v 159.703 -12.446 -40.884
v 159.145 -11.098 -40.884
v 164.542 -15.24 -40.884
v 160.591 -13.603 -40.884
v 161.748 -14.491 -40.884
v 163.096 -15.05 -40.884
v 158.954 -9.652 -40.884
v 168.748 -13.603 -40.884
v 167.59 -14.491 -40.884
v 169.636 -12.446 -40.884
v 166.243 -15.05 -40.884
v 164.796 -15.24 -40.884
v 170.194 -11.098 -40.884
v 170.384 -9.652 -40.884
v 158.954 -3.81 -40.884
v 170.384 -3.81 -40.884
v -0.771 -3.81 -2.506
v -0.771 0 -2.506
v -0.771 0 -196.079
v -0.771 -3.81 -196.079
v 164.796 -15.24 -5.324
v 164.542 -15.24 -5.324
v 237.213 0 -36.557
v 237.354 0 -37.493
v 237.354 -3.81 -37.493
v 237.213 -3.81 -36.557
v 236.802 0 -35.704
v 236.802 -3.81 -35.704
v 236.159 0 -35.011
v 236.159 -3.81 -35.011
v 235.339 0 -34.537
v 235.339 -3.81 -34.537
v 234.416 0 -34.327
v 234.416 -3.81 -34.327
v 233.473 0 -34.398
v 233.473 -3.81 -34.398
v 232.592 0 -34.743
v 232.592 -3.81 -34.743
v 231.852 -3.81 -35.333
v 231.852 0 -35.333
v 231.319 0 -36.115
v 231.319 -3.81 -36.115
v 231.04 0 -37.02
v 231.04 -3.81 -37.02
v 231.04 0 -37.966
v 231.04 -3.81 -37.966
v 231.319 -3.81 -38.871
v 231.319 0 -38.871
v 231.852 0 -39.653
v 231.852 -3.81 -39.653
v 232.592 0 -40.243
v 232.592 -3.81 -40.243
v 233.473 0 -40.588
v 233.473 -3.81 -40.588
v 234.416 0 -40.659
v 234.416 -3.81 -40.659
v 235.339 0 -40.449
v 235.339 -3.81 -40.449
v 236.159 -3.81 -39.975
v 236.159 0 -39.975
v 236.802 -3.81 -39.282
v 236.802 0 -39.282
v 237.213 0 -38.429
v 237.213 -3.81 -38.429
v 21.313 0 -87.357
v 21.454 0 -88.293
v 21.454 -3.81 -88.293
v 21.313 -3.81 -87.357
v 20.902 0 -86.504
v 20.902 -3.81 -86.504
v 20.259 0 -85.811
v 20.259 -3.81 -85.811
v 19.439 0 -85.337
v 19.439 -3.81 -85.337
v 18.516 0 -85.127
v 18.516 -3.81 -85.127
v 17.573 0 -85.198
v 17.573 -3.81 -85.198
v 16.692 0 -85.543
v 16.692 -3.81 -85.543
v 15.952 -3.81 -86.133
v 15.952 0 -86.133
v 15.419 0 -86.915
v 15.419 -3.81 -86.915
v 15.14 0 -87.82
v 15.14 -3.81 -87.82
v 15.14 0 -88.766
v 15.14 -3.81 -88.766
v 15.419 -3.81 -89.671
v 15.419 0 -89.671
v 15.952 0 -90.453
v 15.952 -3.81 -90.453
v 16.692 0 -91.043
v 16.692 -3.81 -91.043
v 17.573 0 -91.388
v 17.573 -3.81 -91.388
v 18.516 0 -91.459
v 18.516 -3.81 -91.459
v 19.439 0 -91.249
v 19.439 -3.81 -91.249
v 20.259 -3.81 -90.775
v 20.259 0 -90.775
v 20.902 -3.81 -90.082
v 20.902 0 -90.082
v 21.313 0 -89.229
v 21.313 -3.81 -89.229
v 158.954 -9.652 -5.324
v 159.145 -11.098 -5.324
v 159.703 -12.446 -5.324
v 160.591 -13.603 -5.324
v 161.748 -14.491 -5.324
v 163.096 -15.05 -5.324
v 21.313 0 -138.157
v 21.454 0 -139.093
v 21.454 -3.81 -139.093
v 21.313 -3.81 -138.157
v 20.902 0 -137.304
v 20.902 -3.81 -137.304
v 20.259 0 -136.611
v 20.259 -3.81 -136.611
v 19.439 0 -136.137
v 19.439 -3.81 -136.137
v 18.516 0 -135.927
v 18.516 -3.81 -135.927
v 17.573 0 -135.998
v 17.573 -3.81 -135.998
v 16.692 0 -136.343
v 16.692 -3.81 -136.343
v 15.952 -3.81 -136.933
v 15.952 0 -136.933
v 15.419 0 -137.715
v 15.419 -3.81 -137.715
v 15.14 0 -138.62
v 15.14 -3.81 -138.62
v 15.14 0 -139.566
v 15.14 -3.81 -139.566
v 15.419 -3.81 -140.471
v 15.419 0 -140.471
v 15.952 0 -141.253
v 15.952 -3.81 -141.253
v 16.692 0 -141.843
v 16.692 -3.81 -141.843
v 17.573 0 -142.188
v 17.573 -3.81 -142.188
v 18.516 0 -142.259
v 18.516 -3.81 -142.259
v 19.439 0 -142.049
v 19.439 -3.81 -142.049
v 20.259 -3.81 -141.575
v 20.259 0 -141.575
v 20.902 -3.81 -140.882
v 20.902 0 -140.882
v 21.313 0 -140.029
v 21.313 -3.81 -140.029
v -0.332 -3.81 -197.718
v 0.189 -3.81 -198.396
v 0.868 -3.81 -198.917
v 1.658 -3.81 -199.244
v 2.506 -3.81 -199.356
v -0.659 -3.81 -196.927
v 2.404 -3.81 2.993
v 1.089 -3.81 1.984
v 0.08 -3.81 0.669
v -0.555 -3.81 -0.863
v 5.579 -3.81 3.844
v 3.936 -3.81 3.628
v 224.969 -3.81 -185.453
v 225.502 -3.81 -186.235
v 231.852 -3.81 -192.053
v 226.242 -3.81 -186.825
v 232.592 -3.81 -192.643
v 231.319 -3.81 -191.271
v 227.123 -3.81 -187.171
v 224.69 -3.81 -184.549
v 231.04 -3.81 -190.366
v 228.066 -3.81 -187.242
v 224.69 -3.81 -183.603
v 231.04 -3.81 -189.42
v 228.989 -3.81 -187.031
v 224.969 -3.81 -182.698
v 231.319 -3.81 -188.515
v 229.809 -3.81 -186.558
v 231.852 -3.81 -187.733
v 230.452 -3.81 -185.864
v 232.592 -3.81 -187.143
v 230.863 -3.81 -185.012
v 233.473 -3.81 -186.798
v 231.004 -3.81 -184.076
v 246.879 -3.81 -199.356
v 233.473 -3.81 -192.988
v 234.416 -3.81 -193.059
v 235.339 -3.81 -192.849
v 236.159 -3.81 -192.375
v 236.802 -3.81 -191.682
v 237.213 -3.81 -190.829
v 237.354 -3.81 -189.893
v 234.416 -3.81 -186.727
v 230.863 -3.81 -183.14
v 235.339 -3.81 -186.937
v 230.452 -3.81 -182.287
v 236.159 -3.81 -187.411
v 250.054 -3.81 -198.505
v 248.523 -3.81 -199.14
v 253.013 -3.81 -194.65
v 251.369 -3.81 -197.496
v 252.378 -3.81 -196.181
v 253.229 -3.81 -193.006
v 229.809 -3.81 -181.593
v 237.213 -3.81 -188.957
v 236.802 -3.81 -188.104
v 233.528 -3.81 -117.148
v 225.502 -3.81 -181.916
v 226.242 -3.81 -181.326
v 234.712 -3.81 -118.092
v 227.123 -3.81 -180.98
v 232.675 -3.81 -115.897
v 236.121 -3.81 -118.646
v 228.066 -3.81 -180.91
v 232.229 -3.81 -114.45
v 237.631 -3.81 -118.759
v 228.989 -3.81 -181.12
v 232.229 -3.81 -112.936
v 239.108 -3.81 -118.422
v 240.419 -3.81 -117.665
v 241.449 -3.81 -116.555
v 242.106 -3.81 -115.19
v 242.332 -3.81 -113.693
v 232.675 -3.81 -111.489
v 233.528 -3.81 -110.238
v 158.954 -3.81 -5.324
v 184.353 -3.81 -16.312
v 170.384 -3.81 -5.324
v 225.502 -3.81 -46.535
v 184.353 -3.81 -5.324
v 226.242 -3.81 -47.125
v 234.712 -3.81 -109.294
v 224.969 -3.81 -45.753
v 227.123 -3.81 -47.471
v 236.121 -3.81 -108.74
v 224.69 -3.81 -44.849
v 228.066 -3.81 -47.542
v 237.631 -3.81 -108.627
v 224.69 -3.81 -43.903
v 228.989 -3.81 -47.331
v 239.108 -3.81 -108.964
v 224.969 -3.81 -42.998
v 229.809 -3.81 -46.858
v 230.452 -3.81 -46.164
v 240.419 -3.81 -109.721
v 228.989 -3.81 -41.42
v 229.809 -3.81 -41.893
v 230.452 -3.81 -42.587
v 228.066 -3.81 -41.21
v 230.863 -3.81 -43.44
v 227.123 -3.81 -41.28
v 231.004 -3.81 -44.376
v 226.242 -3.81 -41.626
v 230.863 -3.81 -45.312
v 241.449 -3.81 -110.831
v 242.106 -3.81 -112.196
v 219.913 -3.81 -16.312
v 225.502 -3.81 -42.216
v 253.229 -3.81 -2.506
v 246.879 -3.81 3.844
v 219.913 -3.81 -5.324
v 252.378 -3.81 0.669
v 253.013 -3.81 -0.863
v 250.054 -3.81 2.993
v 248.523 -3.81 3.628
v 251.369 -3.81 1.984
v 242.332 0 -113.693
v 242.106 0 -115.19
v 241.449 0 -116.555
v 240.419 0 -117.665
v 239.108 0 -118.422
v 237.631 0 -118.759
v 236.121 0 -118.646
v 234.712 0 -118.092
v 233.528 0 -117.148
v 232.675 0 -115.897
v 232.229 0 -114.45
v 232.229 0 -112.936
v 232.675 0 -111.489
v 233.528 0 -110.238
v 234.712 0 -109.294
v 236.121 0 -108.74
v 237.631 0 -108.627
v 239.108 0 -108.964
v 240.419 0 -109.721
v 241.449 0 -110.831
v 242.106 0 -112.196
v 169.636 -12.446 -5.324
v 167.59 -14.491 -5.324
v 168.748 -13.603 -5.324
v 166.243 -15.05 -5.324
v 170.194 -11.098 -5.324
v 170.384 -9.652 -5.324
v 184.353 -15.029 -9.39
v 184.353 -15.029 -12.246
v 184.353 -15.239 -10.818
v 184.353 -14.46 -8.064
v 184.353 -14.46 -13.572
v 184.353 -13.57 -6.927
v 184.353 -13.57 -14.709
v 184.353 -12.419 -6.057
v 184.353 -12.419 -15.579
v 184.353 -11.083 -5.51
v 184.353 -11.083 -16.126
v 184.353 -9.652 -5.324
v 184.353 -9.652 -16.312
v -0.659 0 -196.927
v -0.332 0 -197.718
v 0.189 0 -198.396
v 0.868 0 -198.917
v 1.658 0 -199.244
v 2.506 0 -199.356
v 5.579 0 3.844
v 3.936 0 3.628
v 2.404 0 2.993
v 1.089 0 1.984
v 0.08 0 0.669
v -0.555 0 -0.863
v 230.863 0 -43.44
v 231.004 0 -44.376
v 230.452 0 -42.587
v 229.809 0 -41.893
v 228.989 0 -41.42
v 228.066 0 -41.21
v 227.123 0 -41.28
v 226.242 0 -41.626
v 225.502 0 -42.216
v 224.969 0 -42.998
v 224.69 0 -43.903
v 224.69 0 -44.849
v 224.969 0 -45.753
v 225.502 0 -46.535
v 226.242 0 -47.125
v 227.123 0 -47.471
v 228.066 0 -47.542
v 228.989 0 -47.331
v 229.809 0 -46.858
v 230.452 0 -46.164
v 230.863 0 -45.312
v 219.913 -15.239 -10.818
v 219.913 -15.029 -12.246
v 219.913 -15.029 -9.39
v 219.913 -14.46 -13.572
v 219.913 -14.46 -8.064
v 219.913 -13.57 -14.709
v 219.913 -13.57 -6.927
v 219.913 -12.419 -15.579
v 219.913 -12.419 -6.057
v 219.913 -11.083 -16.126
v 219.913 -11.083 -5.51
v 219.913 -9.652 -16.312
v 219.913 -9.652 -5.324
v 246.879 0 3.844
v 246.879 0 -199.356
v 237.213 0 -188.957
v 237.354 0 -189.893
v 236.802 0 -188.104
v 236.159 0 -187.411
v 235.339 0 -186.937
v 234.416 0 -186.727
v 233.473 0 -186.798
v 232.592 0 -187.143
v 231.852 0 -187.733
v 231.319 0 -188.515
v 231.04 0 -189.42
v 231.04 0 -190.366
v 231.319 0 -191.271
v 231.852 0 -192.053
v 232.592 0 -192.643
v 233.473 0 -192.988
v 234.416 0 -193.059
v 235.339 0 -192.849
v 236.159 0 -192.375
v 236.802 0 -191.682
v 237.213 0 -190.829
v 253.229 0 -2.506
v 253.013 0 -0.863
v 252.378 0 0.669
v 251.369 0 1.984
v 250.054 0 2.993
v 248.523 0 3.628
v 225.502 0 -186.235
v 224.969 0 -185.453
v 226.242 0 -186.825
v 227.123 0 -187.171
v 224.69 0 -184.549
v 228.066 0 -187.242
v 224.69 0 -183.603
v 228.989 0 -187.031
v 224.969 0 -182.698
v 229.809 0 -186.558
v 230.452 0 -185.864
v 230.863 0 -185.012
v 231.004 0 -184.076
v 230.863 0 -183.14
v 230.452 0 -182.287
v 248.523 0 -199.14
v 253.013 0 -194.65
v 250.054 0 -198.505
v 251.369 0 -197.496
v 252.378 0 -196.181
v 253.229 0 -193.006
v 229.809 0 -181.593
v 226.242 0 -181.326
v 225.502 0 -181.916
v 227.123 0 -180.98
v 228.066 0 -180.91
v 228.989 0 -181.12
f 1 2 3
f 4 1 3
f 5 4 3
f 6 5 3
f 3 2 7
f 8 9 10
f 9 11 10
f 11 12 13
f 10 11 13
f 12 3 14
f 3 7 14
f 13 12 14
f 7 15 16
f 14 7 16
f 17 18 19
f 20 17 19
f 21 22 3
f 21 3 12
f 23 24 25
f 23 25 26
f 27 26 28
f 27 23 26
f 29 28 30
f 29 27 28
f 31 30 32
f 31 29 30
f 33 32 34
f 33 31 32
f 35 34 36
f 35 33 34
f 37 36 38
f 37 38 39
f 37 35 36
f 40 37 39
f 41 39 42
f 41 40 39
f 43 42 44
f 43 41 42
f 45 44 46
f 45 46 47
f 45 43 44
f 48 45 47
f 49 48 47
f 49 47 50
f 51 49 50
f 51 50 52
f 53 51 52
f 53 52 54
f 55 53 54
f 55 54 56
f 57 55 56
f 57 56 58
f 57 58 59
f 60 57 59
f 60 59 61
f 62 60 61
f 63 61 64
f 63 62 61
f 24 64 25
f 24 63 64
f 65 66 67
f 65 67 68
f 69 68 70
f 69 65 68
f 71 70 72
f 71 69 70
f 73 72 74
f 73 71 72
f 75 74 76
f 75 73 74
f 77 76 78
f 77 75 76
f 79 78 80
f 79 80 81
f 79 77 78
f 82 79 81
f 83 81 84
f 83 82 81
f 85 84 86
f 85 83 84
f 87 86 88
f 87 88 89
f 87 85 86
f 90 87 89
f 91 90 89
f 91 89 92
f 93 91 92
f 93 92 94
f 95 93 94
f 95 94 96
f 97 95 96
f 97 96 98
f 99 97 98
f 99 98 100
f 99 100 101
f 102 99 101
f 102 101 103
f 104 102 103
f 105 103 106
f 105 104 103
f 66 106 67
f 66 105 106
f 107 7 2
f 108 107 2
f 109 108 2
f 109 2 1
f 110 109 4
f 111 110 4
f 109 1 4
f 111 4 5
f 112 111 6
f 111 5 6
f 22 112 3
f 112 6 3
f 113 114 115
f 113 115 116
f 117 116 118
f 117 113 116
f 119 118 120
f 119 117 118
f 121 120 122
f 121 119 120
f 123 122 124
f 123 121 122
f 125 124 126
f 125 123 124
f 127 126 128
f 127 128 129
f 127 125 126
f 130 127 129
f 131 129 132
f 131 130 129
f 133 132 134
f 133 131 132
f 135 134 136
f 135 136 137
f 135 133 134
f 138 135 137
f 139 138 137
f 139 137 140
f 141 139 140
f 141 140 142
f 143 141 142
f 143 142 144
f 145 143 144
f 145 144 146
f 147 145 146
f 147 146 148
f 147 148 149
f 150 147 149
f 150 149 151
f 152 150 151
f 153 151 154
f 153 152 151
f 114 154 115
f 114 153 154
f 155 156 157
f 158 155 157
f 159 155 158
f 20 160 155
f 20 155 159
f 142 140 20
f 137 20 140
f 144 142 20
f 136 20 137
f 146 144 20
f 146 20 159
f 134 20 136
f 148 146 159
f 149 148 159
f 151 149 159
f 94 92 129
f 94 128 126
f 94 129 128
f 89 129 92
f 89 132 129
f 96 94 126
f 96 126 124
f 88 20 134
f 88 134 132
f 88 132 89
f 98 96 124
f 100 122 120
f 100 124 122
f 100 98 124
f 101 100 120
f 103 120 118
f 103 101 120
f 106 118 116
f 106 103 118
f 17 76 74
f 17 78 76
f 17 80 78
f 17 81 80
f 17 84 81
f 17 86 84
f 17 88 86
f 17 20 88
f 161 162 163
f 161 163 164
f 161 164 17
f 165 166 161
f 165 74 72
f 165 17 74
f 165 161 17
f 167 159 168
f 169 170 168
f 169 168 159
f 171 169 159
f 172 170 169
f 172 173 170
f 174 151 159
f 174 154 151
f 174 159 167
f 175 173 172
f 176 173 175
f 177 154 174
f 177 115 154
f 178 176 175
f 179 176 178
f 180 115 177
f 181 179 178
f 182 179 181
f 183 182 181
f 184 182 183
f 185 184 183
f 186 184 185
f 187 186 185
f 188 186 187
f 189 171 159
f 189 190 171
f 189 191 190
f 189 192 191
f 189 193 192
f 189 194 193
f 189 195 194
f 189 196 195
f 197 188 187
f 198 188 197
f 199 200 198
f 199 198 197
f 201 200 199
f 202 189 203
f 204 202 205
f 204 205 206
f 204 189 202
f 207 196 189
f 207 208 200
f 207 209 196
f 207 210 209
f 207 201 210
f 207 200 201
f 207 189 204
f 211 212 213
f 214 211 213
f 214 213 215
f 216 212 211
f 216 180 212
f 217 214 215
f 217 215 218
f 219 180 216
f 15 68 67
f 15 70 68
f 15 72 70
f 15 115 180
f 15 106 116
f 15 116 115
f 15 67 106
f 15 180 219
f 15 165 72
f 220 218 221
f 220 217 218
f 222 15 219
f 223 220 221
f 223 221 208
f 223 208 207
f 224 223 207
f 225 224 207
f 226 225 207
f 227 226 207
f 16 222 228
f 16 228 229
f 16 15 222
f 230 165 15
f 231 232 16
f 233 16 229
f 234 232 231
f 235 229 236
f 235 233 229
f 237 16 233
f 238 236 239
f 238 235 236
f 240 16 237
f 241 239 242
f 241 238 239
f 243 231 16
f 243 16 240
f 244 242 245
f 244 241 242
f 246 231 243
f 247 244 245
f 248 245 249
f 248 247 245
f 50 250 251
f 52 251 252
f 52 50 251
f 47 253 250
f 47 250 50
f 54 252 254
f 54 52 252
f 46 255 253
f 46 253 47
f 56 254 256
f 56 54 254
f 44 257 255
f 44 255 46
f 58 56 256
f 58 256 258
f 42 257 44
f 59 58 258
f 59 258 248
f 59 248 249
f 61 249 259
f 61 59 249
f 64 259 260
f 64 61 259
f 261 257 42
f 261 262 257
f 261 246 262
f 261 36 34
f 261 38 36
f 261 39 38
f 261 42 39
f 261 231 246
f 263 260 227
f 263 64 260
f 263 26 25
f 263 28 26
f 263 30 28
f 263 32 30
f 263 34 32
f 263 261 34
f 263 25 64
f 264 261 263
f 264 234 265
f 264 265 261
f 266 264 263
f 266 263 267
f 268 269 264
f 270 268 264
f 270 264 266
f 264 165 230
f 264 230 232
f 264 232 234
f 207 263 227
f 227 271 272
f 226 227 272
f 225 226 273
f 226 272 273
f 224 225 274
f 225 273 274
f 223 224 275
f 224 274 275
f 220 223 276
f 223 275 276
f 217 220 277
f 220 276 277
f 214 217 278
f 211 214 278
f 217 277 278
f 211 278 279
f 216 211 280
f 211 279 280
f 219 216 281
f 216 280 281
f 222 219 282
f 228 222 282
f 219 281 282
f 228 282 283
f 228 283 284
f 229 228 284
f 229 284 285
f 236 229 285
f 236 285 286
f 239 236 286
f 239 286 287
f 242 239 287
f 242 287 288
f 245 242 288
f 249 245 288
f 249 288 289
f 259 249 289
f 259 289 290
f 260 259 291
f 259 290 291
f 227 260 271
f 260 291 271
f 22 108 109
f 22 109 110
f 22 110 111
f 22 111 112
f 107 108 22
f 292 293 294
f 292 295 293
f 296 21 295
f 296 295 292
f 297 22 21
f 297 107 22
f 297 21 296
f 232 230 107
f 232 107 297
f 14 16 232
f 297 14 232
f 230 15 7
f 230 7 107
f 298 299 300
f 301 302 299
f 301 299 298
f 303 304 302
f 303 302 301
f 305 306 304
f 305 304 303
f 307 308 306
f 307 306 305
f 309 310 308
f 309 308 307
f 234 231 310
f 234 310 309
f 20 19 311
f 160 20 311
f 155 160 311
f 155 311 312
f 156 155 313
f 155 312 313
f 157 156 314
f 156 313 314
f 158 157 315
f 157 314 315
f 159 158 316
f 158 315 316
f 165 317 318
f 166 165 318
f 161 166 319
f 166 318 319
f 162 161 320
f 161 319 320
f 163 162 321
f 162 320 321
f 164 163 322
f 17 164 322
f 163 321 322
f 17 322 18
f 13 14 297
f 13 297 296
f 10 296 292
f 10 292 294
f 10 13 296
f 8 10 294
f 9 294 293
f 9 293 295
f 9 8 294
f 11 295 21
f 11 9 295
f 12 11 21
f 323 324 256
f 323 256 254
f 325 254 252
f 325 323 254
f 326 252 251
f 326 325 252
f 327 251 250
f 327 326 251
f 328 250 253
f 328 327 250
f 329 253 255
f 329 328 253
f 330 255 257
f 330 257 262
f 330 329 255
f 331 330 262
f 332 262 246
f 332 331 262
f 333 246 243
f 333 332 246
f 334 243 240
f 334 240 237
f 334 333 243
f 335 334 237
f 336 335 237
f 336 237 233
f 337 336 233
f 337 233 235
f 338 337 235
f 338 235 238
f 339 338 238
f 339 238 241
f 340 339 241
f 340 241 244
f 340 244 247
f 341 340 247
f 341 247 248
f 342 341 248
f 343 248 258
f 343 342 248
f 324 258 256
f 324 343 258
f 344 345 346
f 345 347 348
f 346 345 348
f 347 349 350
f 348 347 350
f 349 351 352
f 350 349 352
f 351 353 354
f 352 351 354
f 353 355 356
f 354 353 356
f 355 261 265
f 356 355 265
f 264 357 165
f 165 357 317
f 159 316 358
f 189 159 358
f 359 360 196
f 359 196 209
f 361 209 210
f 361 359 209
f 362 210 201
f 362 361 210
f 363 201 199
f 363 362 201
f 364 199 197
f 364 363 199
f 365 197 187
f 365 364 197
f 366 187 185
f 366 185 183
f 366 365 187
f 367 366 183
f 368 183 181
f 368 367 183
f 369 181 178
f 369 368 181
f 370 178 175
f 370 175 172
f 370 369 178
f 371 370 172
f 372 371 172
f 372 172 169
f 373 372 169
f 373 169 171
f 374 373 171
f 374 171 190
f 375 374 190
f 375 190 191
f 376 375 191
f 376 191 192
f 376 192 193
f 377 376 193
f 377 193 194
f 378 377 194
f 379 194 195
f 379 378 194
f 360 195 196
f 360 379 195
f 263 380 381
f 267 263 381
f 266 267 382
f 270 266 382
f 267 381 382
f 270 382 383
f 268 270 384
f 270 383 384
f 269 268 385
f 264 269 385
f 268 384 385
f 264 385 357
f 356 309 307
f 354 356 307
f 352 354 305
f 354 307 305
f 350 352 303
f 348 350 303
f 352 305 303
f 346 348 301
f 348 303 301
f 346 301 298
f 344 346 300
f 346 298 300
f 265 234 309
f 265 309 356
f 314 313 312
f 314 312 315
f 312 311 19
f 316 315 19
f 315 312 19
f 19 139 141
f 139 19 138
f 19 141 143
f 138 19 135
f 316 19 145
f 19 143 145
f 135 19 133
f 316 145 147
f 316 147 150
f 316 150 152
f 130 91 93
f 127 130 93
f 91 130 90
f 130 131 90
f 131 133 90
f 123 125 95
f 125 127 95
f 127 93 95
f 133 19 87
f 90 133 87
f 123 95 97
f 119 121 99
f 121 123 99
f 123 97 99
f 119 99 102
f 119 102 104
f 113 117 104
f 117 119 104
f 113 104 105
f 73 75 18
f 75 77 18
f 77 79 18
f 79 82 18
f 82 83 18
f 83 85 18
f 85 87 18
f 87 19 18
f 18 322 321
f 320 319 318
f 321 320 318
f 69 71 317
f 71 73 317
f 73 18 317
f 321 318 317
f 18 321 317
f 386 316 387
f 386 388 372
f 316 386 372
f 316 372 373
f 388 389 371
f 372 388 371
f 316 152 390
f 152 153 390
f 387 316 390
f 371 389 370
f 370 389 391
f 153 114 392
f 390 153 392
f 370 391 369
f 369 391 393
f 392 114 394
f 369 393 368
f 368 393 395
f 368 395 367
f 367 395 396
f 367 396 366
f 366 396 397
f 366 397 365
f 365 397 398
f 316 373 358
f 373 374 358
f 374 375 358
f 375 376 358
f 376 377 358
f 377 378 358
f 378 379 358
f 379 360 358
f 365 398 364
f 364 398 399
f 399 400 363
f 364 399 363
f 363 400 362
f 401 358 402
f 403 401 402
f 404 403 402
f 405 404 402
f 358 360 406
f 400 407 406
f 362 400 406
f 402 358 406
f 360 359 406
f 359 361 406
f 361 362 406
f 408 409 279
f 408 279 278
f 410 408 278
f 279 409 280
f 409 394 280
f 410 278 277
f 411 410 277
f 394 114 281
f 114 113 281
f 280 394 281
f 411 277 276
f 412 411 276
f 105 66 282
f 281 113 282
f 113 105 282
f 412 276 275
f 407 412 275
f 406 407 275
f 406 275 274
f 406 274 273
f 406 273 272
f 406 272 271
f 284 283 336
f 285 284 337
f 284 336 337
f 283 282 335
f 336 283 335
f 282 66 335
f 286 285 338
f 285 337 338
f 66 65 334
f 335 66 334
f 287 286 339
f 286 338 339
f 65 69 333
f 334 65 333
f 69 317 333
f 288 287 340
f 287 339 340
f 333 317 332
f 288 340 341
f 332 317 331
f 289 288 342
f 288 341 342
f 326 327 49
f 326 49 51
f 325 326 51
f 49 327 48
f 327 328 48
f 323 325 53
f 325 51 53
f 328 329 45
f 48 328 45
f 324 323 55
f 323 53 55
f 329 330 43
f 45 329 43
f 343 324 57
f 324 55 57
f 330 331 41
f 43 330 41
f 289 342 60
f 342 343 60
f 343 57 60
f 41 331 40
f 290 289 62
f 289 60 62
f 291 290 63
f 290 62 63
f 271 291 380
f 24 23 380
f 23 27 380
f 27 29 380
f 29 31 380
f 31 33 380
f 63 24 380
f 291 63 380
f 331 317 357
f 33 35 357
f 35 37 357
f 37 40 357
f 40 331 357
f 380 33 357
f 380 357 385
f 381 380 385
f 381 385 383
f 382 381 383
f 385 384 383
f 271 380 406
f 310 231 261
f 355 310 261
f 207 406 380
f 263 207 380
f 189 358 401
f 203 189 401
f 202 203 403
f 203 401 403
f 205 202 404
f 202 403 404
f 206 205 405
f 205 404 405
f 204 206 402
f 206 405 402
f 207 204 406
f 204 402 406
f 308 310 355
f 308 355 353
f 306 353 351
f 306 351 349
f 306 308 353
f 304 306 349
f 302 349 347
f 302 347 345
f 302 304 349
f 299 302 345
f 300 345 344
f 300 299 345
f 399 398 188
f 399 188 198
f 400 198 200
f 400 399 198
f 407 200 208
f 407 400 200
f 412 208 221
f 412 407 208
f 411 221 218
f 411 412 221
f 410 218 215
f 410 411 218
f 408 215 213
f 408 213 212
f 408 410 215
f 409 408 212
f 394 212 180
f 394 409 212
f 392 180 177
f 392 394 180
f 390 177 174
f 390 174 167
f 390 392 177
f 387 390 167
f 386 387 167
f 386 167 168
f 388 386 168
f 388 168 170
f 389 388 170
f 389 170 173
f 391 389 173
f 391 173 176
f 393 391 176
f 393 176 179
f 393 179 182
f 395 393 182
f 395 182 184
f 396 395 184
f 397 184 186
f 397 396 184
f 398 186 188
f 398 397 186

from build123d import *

# Parameters (mm, degrees)
F0_R        = 3.175
F0_W        = 11.43
F0_H        = 35.56
F0_W_2      = 35.56
F0_H_2      = 10.9884785938
F1_DEPTH    = 3.81
F2_DEPTH    = 15.24
F3_T1_DEPTH = 35.56
F3_T3_DEPTH = 35.56


# Not quite as in the source:
# - a fillet or chamfer that OpenCascade refuses, or shapes differently, is made with other operations: its cross-section is extruded or revolved along the edge and cut away or added


with BuildPart() as f1:
    # F0 (on Front) → F1 (new body)
    with BuildSketch(Plane.XZ):
        with BuildLine():
            Line((246.8790987015, 3.8439502823), (5.5790987015, 3.8439502823))
            ThreePointArc((5.5790987015, 3.8439502823), (1.0889706409, 1.9840783429), (-0.7709012985, -2.5060497177))
            Line((-0.7709012985, -2.5060497177), (-0.7709012985, -196.0790987015))
            ThreePointArc((-0.7709012985, -196.0790987015), (0.1888954325, -198.3962529867), (2.5060497177, -199.3560497177))
            Line((2.5060497177, -199.3560497177), (246.8790987015, -199.3560497177))
            ThreePointArc((246.8790987015, -199.3560497177), (251.369226762, -197.4961777782), (253.2290987015, -193.0060497177))
            Line((253.2290987015, -193.0060497177), (253.2290987015, -2.5060497177))
            ThreePointArc((253.2290987015, -2.5060497177), (251.369226762, 1.9840783429), (246.8790987015, 3.8439502823))
        make_face()
        with Locations((18.2790987015, -139.0930234075)):
            Circle(F0_R, mode=Mode.SUBTRACT)
        with Locations((234.1790987015, -189.8930234075)):
            Circle(F0_R, mode=Mode.SUBTRACT)
        with Locations((227.8290987015, -184.0757250905)):
            Circle(F0_R, mode=Mode.SUBTRACT)
        with BuildLine():
            ThreePointArc((232.1718121719, -113.6930234075), (237.2518121719, -108.6130234075), (242.3318121719, -113.6930234075))
            ThreePointArc((242.3318121719, -113.6930234075), (237.2518121719, -118.7730234075), (232.1718121719, -113.6930234075))
        make_face(mode=Mode.SUBTRACT)
        with Locations((18.2790987015, -88.2930234075)):
            Circle(F0_R, mode=Mode.SUBTRACT)
        with Locations((164.6692329311, -23.1037478608)):
            Rectangle(F0_W, F0_H, mode=Mode.SUBTRACT)
        with Locations((227.8290987015, -44.3757250905)):
            Circle(F0_R, mode=Mode.SUBTRACT)
        with Locations((234.1790987015, -37.4930234075)):
            Circle(F0_R, mode=Mode.SUBTRACT)
        with Locations((202.1326256323, -10.8179871577)):
            Rectangle(F0_W_2, F0_H_2, mode=Mode.SUBTRACT)
        with Locations((164.6692329311, -23.1037478608)):
            Rectangle(F0_W, F0_H)
        with Locations((202.1326256323, -10.8179871577)):
            Rectangle(F0_W_2, F0_H_2)
    extrude(amount=F1_DEPTH)

    # F0 (on Front) → F2 (join)
    with BuildSketch(Plane.XZ):
        with Locations((164.6692329311, -23.1037478608)):
            Rectangle(F0_W, F0_H)
        with Locations((202.1326256323, -10.8179871577)):
            Rectangle(F0_W_2, F0_H_2)
    extrude(amount=F2_DEPTH)

    # F3: fillet of radius 5.588 on 4 edges, made by hand

    # F3_s2 → F3_t1 (cut)
    with BuildSketch(Plane.XY.offset(-40.8837478608)):
        with BuildLine():
            ThreePointArc((158.9542329311, -9.652), (160.5909202379, -13.6033126933), (164.5422329311, -15.24))
            Line((164.5422329311, -15.24), (164.5422329311, -15.35176))
            Line((164.5422329311, -15.35176), (158.8424729311, -15.35176))
            Line((158.8424729311, -15.35176), (158.8424729311, -9.652))
            Line((158.8424729311, -9.652), (158.9542329311, -9.652))
        make_face()
        with BuildLine():
            ThreePointArc((170.3842329311, -9.652), (168.7475456244, -13.6033126933), (164.7962329311, -15.24))
            Line((164.7962329311, -15.24), (164.7962329311, -15.35176))
            Line((164.7962329311, -15.35176), (170.4959929311, -15.35176))
            Line((170.4959929311, -15.35176), (170.4959929311, -9.652))
            Line((170.4959929311, -9.652), (170.3842329311, -9.652))
        make_face()
    extrude(amount=F3_T1_DEPTH, mode=Mode.SUBTRACT)

    # F3_s4 → F3_t3 (cut)
    with BuildSketch(Plane.YZ.offset(184.3526256323)):
        with BuildLine():
            ThreePointArc((-9.652, -5.3237478608), (-13.6033126933, -6.9604351675), (-15.24, -10.9117478608))
            Line((-15.24, -10.9117478608), (-15.35176, -10.9117478608))
            Line((-15.35176, -10.9117478608), (-15.35176, -5.2119878608))
            Line((-15.35176, -5.2119878608), (-9.652, -5.2119878608))
            Line((-9.652, -5.2119878608), (-9.652, -5.3237478608))
        make_face()
        with BuildLine():
            ThreePointArc((-9.652, -16.3122264546), (-13.6033126933, -14.6755391479), (-15.24, -10.7242264546))
            Line((-15.24, -10.7242264546), (-15.35176, -10.7242264546))
            Line((-15.35176, -10.7242264546), (-15.35176, -16.4239864546))
            Line((-15.35176, -16.4239864546), (-9.652, -16.4239864546))
            Line((-9.652, -16.4239864546), (-9.652, -16.3122264546))
        make_face()
    extrude(amount=F3_T3_DEPTH, mode=Mode.SUBTRACT)


solid = f1.part
